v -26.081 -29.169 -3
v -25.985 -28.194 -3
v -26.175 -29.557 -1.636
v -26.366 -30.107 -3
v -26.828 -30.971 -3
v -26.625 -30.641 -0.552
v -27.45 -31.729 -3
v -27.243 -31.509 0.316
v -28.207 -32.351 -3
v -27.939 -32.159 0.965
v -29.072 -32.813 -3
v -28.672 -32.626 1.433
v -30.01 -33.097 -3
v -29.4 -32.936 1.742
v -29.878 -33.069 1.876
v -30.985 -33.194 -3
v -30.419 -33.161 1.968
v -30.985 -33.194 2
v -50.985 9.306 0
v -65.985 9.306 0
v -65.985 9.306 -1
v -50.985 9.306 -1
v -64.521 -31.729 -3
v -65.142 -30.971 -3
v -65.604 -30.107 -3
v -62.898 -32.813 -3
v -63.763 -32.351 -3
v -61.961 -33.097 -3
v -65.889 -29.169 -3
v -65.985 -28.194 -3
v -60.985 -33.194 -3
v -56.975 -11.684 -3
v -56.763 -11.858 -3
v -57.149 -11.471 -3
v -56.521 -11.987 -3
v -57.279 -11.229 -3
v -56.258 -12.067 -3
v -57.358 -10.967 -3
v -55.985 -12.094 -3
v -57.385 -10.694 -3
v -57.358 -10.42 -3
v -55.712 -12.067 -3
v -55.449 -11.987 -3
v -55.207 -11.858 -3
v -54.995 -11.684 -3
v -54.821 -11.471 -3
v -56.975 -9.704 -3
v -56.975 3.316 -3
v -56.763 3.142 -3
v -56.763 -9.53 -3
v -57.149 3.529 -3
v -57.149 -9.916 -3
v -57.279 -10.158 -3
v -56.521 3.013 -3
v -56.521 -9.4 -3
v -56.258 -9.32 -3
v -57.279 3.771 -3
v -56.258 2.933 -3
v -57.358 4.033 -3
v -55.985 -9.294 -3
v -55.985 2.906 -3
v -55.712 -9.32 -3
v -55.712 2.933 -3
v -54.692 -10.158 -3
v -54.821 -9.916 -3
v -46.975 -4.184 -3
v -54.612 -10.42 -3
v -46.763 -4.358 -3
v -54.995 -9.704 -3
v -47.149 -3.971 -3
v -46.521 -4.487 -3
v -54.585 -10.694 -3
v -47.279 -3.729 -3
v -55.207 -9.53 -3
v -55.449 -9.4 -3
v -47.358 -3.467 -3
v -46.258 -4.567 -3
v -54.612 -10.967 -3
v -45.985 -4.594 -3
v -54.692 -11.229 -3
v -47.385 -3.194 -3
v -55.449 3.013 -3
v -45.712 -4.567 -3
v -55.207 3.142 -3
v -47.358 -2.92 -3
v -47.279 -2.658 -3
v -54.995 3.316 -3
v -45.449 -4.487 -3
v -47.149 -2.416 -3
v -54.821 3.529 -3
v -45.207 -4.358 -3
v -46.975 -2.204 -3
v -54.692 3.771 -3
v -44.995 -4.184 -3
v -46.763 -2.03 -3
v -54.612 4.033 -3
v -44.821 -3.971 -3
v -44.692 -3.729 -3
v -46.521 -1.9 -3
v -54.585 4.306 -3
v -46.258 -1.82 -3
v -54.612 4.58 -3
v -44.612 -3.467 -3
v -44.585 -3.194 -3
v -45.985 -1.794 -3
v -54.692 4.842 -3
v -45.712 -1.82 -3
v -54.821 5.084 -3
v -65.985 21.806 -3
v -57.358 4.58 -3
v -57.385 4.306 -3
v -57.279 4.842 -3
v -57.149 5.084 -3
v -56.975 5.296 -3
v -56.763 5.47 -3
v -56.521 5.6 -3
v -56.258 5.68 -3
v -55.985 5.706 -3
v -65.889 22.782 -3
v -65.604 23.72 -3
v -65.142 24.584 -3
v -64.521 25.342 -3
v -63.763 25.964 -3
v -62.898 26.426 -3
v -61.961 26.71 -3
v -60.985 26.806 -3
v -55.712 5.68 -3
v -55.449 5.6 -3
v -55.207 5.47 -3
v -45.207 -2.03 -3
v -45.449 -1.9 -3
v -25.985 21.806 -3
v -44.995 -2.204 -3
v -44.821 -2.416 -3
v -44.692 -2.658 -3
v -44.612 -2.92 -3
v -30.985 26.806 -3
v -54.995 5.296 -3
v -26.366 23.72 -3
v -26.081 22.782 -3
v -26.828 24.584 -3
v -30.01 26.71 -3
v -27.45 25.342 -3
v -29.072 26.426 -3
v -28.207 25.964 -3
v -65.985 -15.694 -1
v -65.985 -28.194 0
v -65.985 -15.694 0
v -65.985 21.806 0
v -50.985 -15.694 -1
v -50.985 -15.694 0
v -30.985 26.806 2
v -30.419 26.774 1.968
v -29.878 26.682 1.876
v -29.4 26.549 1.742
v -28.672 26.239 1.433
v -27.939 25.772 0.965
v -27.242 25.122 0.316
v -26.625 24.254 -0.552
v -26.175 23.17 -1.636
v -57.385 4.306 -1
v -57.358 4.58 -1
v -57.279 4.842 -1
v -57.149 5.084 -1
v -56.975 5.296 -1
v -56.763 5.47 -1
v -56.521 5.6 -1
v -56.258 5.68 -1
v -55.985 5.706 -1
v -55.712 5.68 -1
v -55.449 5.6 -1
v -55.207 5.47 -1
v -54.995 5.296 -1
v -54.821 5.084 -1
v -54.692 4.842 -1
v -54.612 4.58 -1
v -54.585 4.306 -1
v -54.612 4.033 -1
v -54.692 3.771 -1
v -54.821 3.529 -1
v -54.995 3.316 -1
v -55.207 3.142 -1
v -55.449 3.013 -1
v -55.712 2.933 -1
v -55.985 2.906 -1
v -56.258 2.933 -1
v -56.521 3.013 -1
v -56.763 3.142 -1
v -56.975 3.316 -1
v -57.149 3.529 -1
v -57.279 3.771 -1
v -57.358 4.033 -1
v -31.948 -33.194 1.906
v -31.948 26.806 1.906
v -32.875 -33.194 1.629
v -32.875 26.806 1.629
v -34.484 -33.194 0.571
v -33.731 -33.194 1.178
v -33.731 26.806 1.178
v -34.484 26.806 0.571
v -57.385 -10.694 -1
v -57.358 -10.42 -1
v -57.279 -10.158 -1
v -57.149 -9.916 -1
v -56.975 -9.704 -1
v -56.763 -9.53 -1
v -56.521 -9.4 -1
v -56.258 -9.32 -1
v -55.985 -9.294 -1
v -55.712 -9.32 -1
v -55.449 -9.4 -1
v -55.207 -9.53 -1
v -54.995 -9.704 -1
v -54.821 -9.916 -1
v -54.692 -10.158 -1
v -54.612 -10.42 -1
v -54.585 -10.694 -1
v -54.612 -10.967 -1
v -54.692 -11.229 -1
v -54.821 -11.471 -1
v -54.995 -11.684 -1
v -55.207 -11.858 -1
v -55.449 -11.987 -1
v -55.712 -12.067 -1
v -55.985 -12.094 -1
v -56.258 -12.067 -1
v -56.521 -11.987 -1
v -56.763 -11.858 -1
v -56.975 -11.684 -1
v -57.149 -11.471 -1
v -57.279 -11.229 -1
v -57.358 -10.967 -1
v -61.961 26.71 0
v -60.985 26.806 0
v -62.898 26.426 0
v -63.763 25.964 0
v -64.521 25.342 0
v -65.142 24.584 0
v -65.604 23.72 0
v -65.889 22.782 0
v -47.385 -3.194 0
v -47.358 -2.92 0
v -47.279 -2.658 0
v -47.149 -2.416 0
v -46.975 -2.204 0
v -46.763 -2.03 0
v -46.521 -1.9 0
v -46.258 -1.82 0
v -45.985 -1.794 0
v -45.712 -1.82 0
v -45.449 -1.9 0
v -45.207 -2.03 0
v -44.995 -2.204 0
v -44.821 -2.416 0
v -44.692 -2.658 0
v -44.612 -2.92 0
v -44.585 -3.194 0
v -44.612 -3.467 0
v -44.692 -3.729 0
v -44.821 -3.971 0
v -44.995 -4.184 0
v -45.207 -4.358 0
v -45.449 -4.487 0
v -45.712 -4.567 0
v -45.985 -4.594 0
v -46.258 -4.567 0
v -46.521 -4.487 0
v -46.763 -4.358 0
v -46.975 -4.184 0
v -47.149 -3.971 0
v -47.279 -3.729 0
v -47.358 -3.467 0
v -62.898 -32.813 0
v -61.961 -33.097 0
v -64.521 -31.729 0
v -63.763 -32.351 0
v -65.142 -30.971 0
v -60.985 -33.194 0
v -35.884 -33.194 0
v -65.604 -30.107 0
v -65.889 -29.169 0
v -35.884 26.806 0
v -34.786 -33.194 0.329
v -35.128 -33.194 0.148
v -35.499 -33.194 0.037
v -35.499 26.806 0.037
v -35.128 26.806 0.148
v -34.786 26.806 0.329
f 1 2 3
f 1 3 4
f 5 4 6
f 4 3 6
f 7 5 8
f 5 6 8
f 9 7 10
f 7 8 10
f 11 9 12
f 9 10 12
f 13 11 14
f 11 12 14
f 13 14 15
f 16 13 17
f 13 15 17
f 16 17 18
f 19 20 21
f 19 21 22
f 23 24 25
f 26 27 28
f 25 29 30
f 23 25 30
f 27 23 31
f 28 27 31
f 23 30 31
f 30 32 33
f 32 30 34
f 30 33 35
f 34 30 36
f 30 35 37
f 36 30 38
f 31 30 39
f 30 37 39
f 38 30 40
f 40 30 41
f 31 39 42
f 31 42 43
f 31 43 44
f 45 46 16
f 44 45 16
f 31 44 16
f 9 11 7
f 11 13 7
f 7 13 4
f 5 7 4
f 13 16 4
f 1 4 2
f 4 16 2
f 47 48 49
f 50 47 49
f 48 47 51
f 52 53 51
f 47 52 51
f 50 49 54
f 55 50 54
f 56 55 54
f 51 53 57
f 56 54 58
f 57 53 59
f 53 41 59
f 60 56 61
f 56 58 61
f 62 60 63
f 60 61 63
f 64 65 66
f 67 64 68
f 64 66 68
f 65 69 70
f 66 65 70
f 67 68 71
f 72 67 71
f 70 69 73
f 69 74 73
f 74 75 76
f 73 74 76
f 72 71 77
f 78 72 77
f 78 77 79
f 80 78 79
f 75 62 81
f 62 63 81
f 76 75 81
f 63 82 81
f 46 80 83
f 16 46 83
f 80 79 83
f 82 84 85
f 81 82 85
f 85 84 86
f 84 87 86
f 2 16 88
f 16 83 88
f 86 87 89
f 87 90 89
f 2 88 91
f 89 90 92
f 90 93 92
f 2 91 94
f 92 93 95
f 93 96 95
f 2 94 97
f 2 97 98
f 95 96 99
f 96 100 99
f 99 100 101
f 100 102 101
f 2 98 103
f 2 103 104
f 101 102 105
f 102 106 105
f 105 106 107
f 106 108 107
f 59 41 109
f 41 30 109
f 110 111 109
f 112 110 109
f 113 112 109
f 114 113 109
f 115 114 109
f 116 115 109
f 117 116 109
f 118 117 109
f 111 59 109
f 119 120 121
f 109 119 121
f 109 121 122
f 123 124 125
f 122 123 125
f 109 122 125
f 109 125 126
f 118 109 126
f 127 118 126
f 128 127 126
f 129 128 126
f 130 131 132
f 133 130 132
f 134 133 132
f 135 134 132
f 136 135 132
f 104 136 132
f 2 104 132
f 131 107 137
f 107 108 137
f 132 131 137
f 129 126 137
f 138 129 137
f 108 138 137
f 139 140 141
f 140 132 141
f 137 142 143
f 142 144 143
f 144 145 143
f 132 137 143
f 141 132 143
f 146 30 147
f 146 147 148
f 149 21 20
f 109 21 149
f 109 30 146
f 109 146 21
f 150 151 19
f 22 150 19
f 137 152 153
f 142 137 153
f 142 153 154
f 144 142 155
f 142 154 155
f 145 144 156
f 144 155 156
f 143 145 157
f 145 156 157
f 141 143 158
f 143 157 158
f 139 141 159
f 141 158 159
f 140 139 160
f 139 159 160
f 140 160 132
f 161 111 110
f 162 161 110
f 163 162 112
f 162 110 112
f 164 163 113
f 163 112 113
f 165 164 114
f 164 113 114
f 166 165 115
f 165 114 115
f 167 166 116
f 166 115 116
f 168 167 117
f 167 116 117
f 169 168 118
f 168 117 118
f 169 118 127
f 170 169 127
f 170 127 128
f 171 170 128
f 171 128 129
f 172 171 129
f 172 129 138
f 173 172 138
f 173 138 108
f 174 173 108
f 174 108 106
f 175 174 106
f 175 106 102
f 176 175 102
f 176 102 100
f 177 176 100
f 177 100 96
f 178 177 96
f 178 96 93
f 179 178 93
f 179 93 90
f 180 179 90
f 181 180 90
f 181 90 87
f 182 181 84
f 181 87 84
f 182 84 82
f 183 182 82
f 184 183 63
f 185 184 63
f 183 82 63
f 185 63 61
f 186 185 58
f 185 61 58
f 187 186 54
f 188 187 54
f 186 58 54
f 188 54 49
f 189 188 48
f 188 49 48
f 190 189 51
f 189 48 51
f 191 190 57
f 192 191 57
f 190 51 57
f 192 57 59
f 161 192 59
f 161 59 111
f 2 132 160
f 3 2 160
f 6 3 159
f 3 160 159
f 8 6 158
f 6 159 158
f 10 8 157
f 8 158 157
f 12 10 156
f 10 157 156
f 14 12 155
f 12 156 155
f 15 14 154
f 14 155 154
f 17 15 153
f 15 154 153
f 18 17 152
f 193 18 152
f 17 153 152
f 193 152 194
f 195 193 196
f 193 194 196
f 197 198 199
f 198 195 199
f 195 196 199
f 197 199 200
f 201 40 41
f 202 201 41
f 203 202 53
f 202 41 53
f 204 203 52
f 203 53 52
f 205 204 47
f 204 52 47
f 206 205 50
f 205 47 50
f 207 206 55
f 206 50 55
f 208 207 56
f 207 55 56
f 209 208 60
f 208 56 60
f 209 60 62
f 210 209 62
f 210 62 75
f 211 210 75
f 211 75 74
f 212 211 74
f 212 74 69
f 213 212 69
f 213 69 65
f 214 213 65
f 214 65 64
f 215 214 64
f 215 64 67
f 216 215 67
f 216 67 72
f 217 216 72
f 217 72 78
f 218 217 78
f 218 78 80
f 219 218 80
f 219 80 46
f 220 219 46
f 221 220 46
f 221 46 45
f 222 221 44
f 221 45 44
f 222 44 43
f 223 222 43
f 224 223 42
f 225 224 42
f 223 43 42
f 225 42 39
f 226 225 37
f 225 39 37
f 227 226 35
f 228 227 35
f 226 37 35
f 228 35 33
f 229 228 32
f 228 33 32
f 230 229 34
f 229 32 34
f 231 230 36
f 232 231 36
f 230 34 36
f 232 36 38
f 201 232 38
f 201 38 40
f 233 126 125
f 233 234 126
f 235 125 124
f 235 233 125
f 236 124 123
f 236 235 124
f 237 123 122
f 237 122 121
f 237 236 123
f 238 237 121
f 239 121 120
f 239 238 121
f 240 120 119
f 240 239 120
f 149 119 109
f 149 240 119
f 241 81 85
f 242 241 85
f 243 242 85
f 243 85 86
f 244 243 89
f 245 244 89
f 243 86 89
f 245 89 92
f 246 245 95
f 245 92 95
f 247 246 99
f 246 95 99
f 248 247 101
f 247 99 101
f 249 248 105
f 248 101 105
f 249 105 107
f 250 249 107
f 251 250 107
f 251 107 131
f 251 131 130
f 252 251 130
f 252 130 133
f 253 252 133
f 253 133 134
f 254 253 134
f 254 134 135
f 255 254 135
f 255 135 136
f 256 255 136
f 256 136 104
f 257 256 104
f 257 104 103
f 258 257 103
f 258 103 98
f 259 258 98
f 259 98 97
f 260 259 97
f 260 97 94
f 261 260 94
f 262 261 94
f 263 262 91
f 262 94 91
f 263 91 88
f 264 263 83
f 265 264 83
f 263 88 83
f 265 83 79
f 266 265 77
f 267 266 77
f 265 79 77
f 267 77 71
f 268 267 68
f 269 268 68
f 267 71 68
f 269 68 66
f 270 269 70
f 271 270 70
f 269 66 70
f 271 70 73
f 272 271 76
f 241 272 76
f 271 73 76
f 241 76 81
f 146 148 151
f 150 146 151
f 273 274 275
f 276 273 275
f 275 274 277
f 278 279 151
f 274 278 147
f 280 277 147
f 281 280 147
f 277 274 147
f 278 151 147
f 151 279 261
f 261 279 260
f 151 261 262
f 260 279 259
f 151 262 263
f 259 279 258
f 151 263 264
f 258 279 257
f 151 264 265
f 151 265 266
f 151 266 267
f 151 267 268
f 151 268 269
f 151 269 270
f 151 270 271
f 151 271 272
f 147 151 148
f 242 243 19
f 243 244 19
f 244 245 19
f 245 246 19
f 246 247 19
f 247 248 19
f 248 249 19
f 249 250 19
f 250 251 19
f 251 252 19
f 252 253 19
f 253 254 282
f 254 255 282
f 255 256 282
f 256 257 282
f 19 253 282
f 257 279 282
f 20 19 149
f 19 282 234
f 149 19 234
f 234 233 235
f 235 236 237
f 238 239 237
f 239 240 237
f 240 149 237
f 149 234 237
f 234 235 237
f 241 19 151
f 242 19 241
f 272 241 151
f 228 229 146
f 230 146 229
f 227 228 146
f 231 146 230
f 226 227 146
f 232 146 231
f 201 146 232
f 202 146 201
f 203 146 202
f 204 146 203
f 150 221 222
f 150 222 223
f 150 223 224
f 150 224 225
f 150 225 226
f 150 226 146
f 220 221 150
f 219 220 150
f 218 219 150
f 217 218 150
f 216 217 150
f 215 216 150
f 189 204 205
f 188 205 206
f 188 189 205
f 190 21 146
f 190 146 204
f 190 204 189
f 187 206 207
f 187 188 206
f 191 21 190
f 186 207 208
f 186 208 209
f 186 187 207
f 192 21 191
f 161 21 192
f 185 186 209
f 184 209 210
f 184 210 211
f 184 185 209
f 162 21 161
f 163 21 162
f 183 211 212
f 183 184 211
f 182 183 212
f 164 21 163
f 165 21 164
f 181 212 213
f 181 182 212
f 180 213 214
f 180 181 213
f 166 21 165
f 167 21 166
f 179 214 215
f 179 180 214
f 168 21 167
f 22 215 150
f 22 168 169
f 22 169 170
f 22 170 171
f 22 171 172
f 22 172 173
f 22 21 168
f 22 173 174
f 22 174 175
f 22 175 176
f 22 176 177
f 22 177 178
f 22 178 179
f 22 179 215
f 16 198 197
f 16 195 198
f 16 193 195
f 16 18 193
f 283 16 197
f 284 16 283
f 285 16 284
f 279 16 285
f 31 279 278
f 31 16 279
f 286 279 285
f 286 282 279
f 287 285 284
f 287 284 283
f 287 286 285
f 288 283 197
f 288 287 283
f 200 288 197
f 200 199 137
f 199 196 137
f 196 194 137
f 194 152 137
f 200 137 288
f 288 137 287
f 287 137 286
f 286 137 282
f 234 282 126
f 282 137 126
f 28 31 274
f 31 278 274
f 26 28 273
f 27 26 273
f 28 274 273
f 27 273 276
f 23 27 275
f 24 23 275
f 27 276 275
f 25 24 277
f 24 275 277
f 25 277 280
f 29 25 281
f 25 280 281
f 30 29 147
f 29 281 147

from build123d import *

# Parameters (mm, degrees)
SKETCH1_W                  = 40
SKETCH1_H                  = 60
BOSS_EXTRUDE1_DEPTH        = 3
SKETCH2_W                  = 15
SKETCH2_H                  = 25
CUT_EXTRUDE1_DEPTH         = 1
F_2_8_2_8_DIAMETER_HOLE1_D = 2.8
F_2_8_2_8_DIAMETER_HOLE2_D = 2.8
FILLET1_R                  = 5
BOSS_EXTRUDE2_DEPTH        = 36.5
CUT_EXTRUDE3_DEPTH         = 126
CUT_EXTRUDE4_START         = -126
SKETCH11_W                 = 58.073467033
SKETCH11_H                 = 92.384025597
CUT_EXTRUDE4_DEPTH         = 126
FILLET2_R                  = 2


with BuildPart() as part:
    # Sketch1 → Boss-Extrude1 (new body)
    with BuildSketch(Plane(origin=(0, 0, -3), x_dir=(-1, 0, 0), z_dir=(0, 0, -1))):
        with Locations((45.9850693, -3.193565597)):
            Rectangle(SKETCH1_W, SKETCH1_H)
    extrude(amount=-BOSS_EXTRUDE1_DEPTH)

    # Sketch2 → Cut-Extrude1 (cut)
    with BuildSketch(Plane.XY):
        with Locations((-58.4850693, -3.193565597)):
            Rectangle(SKETCH2_W, SKETCH2_H)
    extrude(amount=-CUT_EXTRUDE1_DEPTH, mode=Mode.SUBTRACT)

    # 2.8 _2.8_ Diameter Hole1 (through all)
    with Locations(Plane.XY):
        with Locations((-45.9850693, -3.193565597)):
            Hole(F_2_8_2_8_DIAMETER_HOLE1_D / 2)

    # 2.8 _2.8_ Diameter Hole2 (through all)
    with Locations(Plane.XY.offset(-1)):
        with Locations((-55.9850693, 4.306434403), (-55.9850693, -10.693565597)):
            Hole(F_2_8_2_8_DIAMETER_HOLE2_D / 2)

    # Fillet1
    fillet1_edges = [part.edges().sort_by_distance(p)[0] for p in [
        (-65.9850693, -33.193565597, -1.5),
        (-25.9850693, -33.193565597, -1.5),
        (-25.9850693, 26.806434403, -1.5),
        (-65.9850693, 26.806434403, -1.5),
    ]]
    fillet(fillet1_edges, radius=FILLET1_R)

    # Sketch8 → Boss-Extrude2 (add, symmetric)
    with BuildSketch(Plane(origin=(0, 0, 0), x_dir=(1, 0, 0), z_dir=(0, 1, 0))):
        with BuildLine():
            Line((-35.9850693, 3), (-25.9850693, 3))
            ThreePointArc((-25.9850693, 3), (-30.9850693, -2), (-35.9850693, 3))
        make_face()
    extrude(amount=BOSS_EXTRUDE2_DEPTH, both=True)

    # Sketch10 → Cut-Extrude3 (cut)
    with BuildSketch(Plane(origin=(0, 26.806434403, 0), x_dir=(1, 0, 0), z_dir=(0, 1, 0))):
        with BuildLine():
            Line((-26.9850693, 0), (-25.9850693, 0))
            Line((-25.9850693, 0), (-25.9850693, 3))
            ThreePointArc((-25.9850693, 3), (-26.24165281, 1.41886117), (-26.9850693, 0))
        make_face()
    extrude(amount=-CUT_EXTRUDE3_DEPTH, mode=Mode.SUBTRACT)

    # Sketch11 → Cut-Extrude4 (cut)
    with BuildSketch(Plane(origin=(0, 0, -3), x_dir=(-1, 0, 0), z_dir=(0, 0, -1)).offset(CUT_EXTRUDE4_START)):
        with Locations((44.104932563, -0.297791146)):
            Rectangle(SKETCH11_W, SKETCH11_H)
        with BuildLine():
            Line((35.9850693, -33.193565597), (60.9850693, -33.193565597))
            ThreePointArc((60.9850693, -33.193565597), (64.520603206, -31.729099503), (65.9850693, -28.193565597))
            Line((65.9850693, -28.193565597), (65.9850693, 21.806434403))
            ThreePointArc((65.9850693, 21.806434403), (64.520603206, 25.341968309), (60.9850693, 26.806434403))
            Line((60.9850693, 26.806434403), (35.9850693, 26.806434403))
            Line((35.9850693, 26.806434403), (30.9850693, 26.806434403))
            ThreePointArc((30.9850693, 26.806434403), (27.449535394, 25.341968309), (25.9850693, 21.806434403))
            Line((25.9850693, 21.806434403), (25.9850693, -28.193565597))
            ThreePointArc((25.9850693, -28.193565597), (27.449535394, -31.729099503), (30.9850693, -33.193565597))
            Line((30.9850693, -33.193565597), (35.9850693, -33.193565597))
        make_face(mode=Mode.SUBTRACT)
    extrude(amount=CUT_EXTRUDE4_DEPTH, mode=Mode.SUBTRACT)

    # Fillet2
    fillet2_edges = [part.edges().sort_by_distance(p)[0] for p in [
        (-34.9850693, -3.193565597, 0),
    ]]
    fillet(fillet2_edges, radius=FILLET2_R)


solid = part.part
